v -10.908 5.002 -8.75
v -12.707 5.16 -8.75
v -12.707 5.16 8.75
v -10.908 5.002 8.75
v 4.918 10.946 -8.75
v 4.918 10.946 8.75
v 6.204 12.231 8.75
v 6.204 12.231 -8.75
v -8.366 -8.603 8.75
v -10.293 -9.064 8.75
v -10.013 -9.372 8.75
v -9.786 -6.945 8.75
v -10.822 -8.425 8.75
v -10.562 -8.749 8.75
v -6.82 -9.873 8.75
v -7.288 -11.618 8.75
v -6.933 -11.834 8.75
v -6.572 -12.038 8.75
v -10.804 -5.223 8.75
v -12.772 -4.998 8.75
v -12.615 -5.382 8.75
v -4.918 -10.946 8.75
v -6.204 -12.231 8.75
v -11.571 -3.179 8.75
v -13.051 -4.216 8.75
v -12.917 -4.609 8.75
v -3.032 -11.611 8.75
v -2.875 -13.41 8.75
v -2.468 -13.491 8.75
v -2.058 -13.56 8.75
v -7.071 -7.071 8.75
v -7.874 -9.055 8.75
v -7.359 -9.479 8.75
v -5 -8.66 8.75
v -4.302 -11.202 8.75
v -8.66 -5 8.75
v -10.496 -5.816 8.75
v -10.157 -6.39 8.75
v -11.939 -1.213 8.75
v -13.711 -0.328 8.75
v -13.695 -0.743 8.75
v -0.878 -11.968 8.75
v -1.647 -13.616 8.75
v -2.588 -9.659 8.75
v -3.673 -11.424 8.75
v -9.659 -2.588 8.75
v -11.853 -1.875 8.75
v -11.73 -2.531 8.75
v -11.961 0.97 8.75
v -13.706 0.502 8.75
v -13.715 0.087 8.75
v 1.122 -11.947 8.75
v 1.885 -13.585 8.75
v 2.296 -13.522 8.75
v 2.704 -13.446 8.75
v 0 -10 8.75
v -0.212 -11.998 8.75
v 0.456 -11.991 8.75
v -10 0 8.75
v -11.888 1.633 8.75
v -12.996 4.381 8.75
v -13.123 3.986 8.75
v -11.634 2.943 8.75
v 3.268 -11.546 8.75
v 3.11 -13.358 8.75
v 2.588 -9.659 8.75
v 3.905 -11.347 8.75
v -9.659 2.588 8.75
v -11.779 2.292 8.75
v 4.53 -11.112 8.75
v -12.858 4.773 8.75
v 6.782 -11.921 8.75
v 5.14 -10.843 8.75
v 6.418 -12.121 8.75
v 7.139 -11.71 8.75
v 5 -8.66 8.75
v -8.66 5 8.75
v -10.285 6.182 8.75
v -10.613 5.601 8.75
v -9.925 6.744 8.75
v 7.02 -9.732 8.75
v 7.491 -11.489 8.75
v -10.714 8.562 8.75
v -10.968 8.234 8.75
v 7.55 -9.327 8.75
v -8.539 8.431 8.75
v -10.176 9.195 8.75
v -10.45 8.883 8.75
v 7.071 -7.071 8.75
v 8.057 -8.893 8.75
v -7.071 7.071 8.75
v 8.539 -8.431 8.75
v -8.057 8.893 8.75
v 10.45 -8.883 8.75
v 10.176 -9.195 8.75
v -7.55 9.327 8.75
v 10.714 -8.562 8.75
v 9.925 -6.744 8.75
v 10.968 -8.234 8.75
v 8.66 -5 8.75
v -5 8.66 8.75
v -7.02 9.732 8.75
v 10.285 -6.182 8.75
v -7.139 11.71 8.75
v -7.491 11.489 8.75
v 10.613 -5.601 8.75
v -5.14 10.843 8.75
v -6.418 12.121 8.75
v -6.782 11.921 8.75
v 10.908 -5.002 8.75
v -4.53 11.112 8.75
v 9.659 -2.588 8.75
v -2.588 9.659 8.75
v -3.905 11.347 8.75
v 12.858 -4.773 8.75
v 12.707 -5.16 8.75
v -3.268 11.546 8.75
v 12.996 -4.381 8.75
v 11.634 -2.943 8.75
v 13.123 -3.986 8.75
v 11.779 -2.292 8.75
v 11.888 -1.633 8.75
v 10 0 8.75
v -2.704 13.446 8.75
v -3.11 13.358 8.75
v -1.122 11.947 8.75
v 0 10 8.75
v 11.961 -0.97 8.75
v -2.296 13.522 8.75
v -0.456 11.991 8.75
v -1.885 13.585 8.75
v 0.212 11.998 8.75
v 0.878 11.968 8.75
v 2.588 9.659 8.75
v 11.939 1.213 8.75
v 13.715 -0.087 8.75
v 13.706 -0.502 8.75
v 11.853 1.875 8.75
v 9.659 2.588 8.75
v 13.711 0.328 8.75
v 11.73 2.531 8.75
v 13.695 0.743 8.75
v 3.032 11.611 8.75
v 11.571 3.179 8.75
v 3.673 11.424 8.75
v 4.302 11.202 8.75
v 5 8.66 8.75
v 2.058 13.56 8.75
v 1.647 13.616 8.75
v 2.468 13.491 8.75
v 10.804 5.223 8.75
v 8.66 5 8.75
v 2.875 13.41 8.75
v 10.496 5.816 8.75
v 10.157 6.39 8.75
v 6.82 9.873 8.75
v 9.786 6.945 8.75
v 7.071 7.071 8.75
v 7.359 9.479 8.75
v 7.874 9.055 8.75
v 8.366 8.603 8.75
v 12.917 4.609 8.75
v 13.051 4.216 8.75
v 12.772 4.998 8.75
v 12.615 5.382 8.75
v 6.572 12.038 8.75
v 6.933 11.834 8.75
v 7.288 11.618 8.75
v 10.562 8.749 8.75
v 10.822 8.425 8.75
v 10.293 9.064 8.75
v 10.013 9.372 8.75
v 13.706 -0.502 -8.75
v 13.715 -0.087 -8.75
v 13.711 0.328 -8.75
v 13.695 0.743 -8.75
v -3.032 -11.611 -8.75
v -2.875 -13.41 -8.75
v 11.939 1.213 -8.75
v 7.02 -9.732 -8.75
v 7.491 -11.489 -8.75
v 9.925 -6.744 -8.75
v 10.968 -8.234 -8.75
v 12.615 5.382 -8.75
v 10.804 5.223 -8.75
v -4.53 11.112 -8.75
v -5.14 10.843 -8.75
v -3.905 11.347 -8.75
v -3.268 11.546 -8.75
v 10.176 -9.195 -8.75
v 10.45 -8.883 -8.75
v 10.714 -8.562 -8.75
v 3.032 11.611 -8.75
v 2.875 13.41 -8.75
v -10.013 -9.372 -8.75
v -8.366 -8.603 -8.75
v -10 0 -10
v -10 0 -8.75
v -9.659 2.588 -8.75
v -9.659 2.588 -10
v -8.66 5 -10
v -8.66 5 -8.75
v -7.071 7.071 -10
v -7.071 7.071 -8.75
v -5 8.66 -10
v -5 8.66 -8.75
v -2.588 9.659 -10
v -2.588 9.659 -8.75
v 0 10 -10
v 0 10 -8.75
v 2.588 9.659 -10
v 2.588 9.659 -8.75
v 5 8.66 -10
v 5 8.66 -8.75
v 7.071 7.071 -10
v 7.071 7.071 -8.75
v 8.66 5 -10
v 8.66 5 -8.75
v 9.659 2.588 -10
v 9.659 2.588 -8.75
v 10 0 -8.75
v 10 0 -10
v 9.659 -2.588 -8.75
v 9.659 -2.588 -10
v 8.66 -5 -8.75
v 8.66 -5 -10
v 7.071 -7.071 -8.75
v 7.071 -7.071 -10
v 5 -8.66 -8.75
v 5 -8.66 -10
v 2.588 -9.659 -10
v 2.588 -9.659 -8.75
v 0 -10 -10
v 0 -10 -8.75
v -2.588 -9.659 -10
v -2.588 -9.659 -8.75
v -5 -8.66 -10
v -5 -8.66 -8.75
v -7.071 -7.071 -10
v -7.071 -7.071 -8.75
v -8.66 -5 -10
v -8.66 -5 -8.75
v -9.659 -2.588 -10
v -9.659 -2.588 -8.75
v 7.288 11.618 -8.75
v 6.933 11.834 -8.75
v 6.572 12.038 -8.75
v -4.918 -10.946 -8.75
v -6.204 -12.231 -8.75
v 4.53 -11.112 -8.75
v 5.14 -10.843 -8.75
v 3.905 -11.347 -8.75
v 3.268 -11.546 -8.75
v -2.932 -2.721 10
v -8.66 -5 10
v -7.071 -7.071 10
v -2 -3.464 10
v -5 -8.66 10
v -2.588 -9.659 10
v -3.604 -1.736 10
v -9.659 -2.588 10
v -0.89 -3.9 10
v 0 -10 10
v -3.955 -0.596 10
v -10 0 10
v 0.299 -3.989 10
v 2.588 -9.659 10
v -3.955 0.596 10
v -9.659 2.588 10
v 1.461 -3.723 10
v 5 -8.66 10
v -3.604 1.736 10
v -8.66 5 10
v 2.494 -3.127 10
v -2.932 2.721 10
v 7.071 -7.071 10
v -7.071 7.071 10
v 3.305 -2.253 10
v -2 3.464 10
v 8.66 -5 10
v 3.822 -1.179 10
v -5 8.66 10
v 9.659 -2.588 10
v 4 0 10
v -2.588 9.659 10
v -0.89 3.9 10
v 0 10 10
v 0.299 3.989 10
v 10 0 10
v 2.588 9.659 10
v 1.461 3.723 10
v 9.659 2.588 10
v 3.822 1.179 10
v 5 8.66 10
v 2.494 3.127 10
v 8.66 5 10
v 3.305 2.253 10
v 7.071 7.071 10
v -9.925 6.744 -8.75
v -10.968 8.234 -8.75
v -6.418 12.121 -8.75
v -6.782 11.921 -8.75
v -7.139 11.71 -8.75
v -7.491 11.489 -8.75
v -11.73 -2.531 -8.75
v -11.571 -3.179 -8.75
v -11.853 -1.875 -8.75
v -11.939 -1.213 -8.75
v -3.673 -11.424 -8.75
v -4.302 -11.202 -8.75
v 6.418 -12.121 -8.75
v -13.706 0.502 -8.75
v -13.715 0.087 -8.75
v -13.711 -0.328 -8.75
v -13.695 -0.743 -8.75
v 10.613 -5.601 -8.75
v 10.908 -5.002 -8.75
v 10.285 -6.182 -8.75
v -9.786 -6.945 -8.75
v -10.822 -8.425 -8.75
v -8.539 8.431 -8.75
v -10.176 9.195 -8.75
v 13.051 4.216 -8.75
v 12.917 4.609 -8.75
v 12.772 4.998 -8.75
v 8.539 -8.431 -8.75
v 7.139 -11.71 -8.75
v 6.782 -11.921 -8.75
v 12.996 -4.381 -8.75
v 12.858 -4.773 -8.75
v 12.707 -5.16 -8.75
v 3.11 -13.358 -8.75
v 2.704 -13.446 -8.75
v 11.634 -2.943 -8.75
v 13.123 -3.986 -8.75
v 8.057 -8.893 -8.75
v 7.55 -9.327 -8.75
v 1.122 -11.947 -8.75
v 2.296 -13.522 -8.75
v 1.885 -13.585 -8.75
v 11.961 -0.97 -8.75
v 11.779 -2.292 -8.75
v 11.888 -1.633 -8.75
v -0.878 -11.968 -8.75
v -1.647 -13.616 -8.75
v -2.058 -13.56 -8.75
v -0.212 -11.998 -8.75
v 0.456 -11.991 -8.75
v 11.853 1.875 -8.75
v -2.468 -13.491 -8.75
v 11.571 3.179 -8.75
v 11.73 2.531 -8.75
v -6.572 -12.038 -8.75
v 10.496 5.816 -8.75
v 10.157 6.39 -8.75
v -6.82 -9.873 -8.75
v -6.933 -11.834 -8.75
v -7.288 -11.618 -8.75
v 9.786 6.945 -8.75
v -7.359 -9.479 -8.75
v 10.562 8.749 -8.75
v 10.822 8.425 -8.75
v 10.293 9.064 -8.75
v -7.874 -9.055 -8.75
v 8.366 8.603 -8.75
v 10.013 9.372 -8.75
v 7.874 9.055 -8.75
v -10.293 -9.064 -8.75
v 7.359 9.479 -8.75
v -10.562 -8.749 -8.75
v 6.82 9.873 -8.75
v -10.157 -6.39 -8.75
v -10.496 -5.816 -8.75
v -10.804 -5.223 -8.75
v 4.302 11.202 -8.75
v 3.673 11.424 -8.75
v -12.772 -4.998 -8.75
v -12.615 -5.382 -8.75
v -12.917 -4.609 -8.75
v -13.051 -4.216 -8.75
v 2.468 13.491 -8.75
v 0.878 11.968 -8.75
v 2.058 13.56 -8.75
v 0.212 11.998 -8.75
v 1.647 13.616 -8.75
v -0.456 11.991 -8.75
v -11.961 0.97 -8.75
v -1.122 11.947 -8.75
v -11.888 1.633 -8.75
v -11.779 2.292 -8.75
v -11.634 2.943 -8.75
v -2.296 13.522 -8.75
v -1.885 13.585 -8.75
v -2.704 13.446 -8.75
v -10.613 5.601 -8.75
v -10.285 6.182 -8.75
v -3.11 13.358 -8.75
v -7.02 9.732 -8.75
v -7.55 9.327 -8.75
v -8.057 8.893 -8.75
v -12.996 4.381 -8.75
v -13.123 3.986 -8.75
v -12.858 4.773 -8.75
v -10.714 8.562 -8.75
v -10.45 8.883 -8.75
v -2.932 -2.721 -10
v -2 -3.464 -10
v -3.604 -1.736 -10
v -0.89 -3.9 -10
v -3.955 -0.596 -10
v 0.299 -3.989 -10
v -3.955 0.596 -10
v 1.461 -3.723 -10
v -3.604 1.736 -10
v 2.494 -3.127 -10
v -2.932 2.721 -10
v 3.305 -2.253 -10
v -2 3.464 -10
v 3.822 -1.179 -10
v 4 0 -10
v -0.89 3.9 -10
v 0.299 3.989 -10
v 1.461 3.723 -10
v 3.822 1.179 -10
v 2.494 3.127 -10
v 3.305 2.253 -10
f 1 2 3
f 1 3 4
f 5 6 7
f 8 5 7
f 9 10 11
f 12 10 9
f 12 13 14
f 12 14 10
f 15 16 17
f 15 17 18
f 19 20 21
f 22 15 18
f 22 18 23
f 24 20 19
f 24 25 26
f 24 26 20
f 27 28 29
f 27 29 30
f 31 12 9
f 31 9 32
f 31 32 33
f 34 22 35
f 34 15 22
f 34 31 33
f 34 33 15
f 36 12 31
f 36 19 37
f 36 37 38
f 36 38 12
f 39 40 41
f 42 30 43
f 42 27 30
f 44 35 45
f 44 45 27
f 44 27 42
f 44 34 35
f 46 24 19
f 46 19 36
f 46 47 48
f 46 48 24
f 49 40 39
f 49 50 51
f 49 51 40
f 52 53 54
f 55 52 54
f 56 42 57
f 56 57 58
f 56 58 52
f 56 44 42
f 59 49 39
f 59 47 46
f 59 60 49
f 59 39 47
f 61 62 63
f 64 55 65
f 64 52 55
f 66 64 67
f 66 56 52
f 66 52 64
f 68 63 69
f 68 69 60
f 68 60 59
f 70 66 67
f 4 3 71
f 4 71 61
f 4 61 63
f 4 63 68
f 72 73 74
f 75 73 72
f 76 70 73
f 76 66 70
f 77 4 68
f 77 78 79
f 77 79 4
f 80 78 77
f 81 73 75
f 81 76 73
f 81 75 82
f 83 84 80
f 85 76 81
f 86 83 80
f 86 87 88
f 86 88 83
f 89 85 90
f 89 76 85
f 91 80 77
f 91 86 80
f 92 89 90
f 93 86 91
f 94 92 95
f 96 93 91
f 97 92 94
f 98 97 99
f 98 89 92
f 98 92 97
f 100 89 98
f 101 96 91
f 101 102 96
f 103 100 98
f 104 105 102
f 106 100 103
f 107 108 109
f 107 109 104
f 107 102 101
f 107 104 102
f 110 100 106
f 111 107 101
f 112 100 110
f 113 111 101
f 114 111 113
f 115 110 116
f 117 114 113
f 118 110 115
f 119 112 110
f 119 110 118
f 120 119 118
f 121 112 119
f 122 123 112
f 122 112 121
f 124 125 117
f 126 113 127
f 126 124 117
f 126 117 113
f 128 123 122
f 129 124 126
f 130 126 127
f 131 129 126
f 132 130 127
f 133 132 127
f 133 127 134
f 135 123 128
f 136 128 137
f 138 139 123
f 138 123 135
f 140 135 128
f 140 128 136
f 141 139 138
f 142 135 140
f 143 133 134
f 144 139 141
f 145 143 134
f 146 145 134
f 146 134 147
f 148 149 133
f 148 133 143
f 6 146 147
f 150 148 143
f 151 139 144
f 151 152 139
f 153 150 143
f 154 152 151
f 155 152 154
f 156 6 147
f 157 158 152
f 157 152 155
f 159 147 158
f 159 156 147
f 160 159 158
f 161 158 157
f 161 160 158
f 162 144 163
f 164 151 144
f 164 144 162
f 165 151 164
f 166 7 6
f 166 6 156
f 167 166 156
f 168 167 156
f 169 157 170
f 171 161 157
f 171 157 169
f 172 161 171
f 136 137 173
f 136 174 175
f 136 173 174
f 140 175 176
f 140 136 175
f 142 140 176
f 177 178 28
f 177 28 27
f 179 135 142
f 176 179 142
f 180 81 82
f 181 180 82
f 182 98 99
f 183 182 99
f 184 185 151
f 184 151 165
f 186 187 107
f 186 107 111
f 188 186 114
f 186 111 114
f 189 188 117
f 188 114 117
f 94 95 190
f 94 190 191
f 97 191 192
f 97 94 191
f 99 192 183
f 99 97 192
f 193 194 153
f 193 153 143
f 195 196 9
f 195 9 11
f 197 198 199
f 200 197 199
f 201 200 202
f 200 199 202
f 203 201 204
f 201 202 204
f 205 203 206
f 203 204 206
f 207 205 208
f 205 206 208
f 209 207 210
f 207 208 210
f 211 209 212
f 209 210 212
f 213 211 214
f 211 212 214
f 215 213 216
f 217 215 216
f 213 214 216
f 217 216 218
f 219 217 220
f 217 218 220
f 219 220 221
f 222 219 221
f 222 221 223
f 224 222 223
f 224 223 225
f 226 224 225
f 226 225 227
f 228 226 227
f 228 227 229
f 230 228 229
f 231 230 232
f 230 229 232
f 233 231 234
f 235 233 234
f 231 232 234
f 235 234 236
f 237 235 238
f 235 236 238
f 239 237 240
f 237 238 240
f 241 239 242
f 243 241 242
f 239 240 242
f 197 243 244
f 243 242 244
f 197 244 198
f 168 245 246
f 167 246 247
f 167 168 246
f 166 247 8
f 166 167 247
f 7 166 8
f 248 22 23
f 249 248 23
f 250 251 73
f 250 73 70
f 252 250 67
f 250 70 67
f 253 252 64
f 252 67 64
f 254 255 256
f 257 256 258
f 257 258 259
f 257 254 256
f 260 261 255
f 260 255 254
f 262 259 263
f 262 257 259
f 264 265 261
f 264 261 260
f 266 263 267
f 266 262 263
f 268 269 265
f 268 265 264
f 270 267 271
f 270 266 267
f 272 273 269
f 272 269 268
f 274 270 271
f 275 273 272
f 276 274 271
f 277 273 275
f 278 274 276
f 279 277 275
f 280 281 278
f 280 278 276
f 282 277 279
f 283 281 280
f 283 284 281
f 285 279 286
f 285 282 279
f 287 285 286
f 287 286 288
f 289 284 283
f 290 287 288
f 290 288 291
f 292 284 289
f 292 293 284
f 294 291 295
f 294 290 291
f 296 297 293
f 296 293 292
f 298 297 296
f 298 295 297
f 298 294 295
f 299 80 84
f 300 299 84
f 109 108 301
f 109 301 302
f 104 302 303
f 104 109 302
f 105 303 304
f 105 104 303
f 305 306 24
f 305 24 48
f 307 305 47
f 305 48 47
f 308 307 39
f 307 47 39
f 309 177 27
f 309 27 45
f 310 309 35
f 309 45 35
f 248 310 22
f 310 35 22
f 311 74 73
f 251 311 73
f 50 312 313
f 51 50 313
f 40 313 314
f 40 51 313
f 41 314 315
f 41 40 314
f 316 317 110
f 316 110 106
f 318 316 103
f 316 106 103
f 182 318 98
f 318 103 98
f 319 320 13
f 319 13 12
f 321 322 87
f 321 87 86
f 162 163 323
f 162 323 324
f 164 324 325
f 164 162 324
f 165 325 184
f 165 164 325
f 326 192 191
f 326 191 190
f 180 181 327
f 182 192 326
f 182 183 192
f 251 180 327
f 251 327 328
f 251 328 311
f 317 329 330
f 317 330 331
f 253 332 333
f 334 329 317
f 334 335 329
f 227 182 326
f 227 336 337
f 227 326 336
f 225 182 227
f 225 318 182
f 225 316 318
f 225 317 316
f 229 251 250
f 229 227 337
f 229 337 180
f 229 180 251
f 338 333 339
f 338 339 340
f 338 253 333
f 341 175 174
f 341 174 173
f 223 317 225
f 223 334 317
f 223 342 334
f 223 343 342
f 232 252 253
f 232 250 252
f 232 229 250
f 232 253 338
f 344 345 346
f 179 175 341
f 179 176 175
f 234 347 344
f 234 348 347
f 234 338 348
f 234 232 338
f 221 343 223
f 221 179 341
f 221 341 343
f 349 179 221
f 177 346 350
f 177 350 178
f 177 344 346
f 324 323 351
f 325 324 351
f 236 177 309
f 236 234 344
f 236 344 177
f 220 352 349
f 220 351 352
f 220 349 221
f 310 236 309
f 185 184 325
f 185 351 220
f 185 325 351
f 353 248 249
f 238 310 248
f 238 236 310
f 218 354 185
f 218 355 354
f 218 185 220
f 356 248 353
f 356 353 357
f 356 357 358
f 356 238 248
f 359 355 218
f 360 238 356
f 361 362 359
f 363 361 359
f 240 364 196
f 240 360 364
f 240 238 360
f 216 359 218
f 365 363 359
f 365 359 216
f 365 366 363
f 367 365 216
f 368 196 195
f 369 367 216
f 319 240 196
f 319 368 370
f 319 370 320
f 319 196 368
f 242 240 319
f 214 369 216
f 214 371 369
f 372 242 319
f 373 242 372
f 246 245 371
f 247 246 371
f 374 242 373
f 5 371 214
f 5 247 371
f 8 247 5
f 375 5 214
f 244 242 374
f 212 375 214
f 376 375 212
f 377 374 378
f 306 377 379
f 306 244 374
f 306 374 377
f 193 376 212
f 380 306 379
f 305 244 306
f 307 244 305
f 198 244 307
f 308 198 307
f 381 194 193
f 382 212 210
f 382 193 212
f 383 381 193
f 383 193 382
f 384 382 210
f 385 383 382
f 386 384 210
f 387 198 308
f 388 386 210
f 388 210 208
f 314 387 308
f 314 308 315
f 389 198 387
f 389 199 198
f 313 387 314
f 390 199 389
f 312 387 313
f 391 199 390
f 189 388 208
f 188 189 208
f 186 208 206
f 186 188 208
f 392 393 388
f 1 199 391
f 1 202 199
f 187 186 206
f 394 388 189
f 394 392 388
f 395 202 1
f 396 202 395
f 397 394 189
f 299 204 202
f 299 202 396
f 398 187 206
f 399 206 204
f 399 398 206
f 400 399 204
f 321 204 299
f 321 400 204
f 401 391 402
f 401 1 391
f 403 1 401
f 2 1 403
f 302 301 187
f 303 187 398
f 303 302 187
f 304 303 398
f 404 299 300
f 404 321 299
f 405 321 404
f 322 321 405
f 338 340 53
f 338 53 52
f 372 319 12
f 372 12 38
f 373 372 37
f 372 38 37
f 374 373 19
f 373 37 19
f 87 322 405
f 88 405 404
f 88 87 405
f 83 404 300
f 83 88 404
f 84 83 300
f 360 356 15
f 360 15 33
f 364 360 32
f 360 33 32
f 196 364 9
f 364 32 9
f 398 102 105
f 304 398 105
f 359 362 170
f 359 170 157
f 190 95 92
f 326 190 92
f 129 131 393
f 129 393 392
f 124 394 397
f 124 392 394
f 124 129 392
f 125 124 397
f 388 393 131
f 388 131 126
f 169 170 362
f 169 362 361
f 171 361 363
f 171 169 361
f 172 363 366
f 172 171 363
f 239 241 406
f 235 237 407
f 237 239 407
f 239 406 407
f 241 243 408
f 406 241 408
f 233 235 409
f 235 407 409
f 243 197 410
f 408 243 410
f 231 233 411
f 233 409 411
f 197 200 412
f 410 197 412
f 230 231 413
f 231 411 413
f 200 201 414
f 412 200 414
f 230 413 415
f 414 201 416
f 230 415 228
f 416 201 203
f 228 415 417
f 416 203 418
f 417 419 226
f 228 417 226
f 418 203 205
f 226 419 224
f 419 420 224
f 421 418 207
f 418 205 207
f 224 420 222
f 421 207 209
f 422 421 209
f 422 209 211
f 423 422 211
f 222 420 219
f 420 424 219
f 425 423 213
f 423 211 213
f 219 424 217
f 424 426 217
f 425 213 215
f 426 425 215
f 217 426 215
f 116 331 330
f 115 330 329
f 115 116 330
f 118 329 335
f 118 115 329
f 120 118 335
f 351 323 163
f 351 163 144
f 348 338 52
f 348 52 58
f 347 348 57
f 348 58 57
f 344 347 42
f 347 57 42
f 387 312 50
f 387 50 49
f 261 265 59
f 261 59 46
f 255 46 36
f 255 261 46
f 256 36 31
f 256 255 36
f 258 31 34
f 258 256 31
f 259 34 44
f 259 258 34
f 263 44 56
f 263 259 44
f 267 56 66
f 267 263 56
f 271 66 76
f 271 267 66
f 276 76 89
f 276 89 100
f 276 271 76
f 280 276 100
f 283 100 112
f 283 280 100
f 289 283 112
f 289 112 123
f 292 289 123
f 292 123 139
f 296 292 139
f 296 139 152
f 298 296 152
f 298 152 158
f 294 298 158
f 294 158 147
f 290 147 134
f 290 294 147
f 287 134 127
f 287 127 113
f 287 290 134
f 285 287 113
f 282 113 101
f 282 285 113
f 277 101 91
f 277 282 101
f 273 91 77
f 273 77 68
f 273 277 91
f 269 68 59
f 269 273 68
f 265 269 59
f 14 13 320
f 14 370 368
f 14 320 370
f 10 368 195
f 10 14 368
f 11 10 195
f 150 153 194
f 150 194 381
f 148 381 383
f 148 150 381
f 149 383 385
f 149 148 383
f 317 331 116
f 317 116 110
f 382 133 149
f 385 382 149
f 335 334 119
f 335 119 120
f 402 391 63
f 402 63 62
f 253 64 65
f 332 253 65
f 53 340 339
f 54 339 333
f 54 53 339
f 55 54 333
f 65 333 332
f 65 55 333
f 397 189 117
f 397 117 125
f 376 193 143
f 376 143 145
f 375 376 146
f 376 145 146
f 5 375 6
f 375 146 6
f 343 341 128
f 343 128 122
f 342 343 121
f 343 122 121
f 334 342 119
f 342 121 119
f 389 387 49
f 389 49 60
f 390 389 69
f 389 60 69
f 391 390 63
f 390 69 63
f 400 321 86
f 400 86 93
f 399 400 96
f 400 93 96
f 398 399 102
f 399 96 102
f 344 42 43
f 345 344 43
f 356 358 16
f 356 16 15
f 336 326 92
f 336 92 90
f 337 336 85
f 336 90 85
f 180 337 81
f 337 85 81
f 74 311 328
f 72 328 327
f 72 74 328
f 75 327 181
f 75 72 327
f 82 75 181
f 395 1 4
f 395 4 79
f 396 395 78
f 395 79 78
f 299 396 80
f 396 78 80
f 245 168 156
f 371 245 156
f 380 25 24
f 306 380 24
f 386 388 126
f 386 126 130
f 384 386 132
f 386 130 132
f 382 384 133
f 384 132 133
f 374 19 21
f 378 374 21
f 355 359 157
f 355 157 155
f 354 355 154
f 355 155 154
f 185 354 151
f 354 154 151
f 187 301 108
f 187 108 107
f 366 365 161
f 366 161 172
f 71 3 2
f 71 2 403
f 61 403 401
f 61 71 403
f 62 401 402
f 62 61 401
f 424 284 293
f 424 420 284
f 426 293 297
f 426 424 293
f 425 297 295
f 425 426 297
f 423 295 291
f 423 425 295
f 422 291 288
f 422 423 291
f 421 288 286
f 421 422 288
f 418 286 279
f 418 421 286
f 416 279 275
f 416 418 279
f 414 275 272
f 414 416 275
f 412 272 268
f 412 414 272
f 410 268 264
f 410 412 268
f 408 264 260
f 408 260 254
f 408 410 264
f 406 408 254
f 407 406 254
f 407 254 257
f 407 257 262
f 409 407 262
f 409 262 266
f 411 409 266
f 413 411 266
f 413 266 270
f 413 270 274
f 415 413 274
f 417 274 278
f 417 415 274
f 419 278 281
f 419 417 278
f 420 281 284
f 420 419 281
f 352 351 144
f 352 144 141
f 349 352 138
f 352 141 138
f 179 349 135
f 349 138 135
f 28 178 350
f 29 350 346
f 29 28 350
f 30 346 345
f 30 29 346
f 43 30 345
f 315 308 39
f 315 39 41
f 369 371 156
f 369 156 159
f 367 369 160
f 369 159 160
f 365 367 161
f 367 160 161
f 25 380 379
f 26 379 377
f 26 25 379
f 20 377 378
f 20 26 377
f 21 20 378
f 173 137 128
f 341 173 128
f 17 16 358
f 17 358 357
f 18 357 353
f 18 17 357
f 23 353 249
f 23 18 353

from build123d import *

# Parameters (mm, degrees)
ESQUISSE1_R                  = 13.715
ESQUISSE1_R_2                = 4
BASE_EXTRUSION_DEPTH         = 10
ENL_V_MAT_EXTRU_1_DEPTH      = 28.860410083
R_P_TITION_CIRCULAIRE1_COUNT = 18
ENL_V_START                  = -1.25
ESQUISSE3_R                  = 13.715
ESQUISSE3_R_2                = 10
ENL_V_MAT_EXTRU_2_DEPTH      = 1.25
ESQUISSE4_R                  = 13.715
ESQUISSE4_R_2                = 10
ENL_V_MAT_EXTRU_3_DEPTH      = 1.25


with BuildPart() as part:
    # Esquisse1 → Base-Extrusion (new, symmetric)
    with BuildSketch(Plane.XY):
        Circle(ESQUISSE1_R)
        Circle(ESQUISSE1_R_2, mode=Mode.SUBTRACT)
    extrude(amount=BASE_EXTRUSION_DEPTH, both=True)

    # Esquisse2 → Enlèv. mat.-Extru.1 (cut, through all)
    with BuildSketch(Plane.XY.offset(10)):
        with BuildLine():
            Line((0.878200621, 11.96782201), (1.646660653, 13.615789867))
            ThreePointArc((1.646660653, 13.615789867), (-0.120274569, 13.714472612), (-1.885207275, 13.584815734))
            Line((-1.885207275, 13.584815734), (-1.121695723, 11.947459927))
            ThreePointArc((-1.121695723, 11.947459927), (-0.1221725, 11.999378062), (0.878200621, 11.96782201))
        make_face()
    enl_v_mat_extru_1 = extrude(amount=-ENL_V_MAT_EXTRU_1_DEPTH, mode=Mode.SUBTRACT)

    # Répétition circulaire1: Enlèv. mat.-Extru.1 ×18 about axis
    r_p_tition_circulaire1_axis = Axis((0, 0, 0), (0, 0, 1))
    for i in range(1, R_P_TITION_CIRCULAIRE1_COUNT):
        add(enl_v_mat_extru_1.rotate(r_p_tition_circulaire1_axis, i * 360 / R_P_TITION_CIRCULAIRE1_COUNT), mode=Mode.SUBTRACT)

    # Esquisse3 → Enlèv. mat.-Extru.2 (cut)
    with BuildSketch(Plane(origin=(0, 0, -10), x_dir=(-1, 0, 0), z_dir=(0, 0, -1)).offset(ENL_V_START)):
        Circle(ESQUISSE3_R)
        Circle(ESQUISSE3_R_2, mode=Mode.SUBTRACT)
    extrude(amount=ENL_V_MAT_EXTRU_2_DEPTH, mode=Mode.SUBTRACT)

    # Esquisse4 → Enlèv. mat.-Extru.3 (cut)
    with BuildSketch(Plane.XY.offset(10)):
        Circle(ESQUISSE4_R)
        with Locations(Location((0, 0, 0), (0, 0, 180))):
            Circle(ESQUISSE4_R_2, mode=Mode.SUBTRACT)
    extrude(amount=-ENL_V_MAT_EXTRU_3_DEPTH, mode=Mode.SUBTRACT)


solid = part.part
